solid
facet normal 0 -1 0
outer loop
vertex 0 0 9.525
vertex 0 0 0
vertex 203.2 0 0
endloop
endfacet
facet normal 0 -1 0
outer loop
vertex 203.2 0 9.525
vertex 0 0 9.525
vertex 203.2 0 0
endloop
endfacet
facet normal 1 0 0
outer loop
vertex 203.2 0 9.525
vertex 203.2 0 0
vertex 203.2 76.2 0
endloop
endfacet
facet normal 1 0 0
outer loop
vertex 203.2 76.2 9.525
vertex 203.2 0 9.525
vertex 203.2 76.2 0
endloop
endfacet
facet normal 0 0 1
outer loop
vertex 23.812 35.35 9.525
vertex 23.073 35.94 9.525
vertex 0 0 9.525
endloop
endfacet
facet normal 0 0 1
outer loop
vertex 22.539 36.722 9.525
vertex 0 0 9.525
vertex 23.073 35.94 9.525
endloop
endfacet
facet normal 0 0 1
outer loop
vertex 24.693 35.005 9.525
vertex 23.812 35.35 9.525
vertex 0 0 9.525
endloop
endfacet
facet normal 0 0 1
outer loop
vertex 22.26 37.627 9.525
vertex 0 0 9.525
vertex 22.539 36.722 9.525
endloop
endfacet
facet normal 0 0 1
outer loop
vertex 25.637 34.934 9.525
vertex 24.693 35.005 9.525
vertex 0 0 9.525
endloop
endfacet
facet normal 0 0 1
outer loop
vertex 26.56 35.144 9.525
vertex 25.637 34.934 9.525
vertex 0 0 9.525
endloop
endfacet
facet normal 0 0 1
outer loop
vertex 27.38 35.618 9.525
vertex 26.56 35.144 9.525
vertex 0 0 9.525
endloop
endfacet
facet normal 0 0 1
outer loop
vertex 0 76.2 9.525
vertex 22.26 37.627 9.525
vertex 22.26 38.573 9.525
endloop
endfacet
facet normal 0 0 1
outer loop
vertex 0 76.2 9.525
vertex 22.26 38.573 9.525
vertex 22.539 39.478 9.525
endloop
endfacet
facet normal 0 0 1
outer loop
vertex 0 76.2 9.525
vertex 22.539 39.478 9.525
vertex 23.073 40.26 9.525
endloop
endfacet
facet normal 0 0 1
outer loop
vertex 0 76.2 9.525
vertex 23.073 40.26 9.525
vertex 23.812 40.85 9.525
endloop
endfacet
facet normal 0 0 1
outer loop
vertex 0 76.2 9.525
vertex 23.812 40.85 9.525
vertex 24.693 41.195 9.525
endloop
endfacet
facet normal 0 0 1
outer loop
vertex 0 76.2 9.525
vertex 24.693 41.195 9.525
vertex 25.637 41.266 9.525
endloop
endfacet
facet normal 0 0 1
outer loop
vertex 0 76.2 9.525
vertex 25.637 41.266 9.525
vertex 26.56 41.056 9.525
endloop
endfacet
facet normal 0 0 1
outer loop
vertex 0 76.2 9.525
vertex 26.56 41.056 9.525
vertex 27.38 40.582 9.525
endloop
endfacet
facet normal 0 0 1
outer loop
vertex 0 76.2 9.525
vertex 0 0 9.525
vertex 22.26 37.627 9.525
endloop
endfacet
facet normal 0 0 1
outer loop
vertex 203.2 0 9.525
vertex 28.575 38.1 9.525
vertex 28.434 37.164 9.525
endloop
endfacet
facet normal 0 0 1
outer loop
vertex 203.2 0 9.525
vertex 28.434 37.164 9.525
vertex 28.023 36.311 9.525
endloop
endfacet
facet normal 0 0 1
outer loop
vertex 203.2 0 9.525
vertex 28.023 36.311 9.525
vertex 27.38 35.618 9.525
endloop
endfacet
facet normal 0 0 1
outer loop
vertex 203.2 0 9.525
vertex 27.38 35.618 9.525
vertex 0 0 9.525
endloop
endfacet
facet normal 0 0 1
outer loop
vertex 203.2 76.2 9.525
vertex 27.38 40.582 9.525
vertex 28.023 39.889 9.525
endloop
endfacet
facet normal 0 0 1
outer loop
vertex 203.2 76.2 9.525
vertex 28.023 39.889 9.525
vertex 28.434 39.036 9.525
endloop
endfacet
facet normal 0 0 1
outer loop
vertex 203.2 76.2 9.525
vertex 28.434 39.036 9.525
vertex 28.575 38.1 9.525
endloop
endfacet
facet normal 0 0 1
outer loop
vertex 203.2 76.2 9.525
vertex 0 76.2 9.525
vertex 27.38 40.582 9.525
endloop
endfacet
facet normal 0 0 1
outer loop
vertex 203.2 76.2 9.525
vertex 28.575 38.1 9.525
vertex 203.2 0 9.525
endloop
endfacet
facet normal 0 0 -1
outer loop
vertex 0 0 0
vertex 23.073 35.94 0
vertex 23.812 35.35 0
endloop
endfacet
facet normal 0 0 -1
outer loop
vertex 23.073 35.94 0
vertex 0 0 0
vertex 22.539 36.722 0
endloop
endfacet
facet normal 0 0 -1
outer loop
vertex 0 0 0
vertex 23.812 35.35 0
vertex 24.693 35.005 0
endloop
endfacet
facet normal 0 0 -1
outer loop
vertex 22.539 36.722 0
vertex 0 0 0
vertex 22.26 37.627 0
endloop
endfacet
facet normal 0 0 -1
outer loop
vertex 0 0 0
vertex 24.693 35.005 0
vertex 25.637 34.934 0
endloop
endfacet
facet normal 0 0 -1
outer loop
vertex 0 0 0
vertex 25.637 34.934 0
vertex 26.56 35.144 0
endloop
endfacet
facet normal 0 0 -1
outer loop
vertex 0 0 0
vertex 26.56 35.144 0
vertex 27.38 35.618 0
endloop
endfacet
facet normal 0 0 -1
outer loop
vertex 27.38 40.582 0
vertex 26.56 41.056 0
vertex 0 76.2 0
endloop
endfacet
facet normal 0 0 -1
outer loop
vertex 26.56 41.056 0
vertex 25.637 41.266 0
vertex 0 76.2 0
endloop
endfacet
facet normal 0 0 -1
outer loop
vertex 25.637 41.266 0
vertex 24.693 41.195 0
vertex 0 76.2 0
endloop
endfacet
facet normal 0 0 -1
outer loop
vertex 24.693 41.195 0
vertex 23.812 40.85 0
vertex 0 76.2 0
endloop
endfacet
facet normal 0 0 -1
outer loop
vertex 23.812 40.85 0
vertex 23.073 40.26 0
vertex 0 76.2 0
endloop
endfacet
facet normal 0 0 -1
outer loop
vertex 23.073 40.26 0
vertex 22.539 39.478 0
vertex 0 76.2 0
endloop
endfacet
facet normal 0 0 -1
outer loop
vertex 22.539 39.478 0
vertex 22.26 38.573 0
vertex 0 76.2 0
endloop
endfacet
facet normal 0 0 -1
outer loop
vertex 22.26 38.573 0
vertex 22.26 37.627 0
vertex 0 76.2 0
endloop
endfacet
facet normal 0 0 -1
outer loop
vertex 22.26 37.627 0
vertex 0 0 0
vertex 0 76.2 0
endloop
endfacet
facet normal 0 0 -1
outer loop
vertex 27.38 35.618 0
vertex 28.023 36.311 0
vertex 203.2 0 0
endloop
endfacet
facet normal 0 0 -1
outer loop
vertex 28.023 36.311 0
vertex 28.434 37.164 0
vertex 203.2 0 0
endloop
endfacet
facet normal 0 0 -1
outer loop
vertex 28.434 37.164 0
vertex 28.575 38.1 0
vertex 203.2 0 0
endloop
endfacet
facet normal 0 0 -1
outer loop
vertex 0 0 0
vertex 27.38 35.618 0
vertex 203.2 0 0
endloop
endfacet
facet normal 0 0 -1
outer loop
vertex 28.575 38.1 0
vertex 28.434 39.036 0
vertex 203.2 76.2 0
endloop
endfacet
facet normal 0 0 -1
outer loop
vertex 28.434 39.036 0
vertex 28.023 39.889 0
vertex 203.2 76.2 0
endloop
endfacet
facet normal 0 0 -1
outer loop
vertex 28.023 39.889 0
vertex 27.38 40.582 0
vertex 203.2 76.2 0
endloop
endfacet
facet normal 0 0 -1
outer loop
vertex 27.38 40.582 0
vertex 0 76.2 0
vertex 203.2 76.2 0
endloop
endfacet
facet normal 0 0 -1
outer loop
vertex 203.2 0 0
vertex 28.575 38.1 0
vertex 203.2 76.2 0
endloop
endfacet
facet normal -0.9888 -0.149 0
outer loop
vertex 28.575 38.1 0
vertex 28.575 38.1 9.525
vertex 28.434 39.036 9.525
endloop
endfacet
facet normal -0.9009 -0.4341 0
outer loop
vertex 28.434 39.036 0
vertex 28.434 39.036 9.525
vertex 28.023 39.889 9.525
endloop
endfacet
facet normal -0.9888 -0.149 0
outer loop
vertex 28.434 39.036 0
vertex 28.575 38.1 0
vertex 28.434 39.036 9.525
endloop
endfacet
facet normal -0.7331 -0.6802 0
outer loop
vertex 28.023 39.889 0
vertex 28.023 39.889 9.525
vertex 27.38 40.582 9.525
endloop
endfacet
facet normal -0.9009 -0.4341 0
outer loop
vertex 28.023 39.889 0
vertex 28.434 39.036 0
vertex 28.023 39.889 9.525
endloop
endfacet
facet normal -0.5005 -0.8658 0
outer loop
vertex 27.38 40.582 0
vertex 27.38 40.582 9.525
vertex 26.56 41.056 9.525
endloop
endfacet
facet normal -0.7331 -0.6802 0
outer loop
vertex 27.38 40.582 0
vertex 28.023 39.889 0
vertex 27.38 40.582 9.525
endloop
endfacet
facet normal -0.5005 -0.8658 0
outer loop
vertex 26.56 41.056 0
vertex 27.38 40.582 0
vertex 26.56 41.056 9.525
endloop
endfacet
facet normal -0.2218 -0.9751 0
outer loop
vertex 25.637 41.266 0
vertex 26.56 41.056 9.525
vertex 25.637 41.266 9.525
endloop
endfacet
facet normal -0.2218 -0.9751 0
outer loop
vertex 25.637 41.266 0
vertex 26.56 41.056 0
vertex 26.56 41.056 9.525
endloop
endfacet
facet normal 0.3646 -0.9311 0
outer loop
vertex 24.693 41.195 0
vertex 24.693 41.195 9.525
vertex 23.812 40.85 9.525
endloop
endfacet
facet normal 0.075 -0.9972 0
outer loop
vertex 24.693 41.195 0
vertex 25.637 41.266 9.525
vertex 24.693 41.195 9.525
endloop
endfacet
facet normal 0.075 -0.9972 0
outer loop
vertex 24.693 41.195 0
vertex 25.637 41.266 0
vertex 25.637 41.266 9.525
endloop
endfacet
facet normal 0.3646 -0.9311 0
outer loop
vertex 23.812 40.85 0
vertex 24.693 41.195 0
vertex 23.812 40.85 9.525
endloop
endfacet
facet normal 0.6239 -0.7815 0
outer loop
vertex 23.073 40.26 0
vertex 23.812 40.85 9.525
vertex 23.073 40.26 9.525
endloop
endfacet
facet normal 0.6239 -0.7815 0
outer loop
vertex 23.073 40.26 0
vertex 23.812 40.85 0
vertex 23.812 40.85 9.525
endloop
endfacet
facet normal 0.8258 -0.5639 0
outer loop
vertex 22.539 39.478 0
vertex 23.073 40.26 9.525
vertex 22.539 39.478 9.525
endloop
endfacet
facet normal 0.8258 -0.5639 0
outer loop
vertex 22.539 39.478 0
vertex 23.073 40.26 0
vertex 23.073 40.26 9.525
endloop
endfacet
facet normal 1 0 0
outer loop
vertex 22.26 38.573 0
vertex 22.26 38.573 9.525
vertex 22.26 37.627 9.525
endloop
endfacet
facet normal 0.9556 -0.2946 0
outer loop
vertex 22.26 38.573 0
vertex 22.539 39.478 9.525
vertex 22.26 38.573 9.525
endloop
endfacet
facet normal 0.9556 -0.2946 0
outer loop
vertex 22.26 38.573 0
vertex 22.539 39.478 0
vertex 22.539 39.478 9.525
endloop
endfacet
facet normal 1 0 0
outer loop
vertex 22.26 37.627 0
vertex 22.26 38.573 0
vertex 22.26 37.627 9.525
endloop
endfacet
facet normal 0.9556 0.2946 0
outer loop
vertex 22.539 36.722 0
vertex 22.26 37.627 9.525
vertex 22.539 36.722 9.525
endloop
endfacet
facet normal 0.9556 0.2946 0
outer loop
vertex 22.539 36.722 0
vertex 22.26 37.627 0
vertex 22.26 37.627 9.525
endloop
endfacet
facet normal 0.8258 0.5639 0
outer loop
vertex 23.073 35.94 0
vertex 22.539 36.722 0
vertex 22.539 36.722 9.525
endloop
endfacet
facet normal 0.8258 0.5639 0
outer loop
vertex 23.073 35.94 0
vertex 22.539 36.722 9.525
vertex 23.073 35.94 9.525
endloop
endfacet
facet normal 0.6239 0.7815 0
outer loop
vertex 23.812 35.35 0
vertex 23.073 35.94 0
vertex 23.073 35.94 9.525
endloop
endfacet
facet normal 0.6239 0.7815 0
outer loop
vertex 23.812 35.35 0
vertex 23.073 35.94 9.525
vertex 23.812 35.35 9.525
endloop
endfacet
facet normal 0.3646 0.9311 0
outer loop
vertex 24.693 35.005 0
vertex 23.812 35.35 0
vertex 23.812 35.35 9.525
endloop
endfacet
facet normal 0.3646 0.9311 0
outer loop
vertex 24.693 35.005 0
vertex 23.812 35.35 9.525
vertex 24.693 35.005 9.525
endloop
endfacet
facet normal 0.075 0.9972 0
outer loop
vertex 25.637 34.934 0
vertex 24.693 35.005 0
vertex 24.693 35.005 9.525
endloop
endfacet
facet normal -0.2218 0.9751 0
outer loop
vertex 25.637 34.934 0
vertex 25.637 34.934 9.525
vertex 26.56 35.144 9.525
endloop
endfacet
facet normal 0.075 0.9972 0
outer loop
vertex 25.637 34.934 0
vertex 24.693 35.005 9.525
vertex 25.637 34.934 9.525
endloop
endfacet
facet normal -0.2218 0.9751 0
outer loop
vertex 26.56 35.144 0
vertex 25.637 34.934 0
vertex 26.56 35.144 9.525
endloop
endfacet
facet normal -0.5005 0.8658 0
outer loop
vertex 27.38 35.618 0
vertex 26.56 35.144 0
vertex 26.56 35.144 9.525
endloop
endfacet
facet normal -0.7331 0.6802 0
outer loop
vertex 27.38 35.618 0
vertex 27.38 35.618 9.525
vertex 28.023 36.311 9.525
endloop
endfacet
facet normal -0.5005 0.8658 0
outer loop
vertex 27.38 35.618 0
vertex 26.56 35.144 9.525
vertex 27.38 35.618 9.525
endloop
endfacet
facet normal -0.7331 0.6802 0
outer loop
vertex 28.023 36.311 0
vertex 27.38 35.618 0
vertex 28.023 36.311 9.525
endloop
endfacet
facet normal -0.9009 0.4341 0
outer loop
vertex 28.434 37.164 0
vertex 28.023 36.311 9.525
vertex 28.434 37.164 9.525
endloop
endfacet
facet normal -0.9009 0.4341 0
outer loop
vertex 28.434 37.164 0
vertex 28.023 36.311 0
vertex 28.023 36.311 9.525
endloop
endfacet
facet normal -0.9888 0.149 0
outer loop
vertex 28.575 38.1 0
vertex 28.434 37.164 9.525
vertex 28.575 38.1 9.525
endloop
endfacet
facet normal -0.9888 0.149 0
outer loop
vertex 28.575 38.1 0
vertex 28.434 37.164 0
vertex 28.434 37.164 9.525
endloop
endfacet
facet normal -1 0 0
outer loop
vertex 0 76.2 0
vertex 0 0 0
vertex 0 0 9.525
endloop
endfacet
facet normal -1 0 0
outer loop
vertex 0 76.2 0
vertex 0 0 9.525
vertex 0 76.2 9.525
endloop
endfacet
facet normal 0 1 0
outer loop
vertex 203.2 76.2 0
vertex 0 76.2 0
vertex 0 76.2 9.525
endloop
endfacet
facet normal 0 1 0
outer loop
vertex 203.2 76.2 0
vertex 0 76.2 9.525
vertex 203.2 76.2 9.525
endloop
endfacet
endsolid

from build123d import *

# Parameters (mm, degrees)
SKETCH1_W       = 203.2
SKETCH1_H       = 76.2
PLATE_DEPTH     = 9.525
SKETCH2_R       = 3.175
SEED_HOLE_DEPTH = 218.226622735


with BuildPart() as part:
    # Sketch1 → plate (new body)
    with BuildSketch(Plane.XY):
        with Locations((101.6, 38.1)):
            Rectangle(SKETCH1_W, SKETCH1_H)
    extrude(amount=PLATE_DEPTH)

    # Sketch2 → seed_hole (cut, through all)
    with BuildSketch(Plane.XY):
        with Locations((25.4, 38.1)):
            Circle(SKETCH2_R)
    extrude(amount=SEED_HOLE_DEPTH, mode=Mode.SUBTRACT)


solid = part.part
